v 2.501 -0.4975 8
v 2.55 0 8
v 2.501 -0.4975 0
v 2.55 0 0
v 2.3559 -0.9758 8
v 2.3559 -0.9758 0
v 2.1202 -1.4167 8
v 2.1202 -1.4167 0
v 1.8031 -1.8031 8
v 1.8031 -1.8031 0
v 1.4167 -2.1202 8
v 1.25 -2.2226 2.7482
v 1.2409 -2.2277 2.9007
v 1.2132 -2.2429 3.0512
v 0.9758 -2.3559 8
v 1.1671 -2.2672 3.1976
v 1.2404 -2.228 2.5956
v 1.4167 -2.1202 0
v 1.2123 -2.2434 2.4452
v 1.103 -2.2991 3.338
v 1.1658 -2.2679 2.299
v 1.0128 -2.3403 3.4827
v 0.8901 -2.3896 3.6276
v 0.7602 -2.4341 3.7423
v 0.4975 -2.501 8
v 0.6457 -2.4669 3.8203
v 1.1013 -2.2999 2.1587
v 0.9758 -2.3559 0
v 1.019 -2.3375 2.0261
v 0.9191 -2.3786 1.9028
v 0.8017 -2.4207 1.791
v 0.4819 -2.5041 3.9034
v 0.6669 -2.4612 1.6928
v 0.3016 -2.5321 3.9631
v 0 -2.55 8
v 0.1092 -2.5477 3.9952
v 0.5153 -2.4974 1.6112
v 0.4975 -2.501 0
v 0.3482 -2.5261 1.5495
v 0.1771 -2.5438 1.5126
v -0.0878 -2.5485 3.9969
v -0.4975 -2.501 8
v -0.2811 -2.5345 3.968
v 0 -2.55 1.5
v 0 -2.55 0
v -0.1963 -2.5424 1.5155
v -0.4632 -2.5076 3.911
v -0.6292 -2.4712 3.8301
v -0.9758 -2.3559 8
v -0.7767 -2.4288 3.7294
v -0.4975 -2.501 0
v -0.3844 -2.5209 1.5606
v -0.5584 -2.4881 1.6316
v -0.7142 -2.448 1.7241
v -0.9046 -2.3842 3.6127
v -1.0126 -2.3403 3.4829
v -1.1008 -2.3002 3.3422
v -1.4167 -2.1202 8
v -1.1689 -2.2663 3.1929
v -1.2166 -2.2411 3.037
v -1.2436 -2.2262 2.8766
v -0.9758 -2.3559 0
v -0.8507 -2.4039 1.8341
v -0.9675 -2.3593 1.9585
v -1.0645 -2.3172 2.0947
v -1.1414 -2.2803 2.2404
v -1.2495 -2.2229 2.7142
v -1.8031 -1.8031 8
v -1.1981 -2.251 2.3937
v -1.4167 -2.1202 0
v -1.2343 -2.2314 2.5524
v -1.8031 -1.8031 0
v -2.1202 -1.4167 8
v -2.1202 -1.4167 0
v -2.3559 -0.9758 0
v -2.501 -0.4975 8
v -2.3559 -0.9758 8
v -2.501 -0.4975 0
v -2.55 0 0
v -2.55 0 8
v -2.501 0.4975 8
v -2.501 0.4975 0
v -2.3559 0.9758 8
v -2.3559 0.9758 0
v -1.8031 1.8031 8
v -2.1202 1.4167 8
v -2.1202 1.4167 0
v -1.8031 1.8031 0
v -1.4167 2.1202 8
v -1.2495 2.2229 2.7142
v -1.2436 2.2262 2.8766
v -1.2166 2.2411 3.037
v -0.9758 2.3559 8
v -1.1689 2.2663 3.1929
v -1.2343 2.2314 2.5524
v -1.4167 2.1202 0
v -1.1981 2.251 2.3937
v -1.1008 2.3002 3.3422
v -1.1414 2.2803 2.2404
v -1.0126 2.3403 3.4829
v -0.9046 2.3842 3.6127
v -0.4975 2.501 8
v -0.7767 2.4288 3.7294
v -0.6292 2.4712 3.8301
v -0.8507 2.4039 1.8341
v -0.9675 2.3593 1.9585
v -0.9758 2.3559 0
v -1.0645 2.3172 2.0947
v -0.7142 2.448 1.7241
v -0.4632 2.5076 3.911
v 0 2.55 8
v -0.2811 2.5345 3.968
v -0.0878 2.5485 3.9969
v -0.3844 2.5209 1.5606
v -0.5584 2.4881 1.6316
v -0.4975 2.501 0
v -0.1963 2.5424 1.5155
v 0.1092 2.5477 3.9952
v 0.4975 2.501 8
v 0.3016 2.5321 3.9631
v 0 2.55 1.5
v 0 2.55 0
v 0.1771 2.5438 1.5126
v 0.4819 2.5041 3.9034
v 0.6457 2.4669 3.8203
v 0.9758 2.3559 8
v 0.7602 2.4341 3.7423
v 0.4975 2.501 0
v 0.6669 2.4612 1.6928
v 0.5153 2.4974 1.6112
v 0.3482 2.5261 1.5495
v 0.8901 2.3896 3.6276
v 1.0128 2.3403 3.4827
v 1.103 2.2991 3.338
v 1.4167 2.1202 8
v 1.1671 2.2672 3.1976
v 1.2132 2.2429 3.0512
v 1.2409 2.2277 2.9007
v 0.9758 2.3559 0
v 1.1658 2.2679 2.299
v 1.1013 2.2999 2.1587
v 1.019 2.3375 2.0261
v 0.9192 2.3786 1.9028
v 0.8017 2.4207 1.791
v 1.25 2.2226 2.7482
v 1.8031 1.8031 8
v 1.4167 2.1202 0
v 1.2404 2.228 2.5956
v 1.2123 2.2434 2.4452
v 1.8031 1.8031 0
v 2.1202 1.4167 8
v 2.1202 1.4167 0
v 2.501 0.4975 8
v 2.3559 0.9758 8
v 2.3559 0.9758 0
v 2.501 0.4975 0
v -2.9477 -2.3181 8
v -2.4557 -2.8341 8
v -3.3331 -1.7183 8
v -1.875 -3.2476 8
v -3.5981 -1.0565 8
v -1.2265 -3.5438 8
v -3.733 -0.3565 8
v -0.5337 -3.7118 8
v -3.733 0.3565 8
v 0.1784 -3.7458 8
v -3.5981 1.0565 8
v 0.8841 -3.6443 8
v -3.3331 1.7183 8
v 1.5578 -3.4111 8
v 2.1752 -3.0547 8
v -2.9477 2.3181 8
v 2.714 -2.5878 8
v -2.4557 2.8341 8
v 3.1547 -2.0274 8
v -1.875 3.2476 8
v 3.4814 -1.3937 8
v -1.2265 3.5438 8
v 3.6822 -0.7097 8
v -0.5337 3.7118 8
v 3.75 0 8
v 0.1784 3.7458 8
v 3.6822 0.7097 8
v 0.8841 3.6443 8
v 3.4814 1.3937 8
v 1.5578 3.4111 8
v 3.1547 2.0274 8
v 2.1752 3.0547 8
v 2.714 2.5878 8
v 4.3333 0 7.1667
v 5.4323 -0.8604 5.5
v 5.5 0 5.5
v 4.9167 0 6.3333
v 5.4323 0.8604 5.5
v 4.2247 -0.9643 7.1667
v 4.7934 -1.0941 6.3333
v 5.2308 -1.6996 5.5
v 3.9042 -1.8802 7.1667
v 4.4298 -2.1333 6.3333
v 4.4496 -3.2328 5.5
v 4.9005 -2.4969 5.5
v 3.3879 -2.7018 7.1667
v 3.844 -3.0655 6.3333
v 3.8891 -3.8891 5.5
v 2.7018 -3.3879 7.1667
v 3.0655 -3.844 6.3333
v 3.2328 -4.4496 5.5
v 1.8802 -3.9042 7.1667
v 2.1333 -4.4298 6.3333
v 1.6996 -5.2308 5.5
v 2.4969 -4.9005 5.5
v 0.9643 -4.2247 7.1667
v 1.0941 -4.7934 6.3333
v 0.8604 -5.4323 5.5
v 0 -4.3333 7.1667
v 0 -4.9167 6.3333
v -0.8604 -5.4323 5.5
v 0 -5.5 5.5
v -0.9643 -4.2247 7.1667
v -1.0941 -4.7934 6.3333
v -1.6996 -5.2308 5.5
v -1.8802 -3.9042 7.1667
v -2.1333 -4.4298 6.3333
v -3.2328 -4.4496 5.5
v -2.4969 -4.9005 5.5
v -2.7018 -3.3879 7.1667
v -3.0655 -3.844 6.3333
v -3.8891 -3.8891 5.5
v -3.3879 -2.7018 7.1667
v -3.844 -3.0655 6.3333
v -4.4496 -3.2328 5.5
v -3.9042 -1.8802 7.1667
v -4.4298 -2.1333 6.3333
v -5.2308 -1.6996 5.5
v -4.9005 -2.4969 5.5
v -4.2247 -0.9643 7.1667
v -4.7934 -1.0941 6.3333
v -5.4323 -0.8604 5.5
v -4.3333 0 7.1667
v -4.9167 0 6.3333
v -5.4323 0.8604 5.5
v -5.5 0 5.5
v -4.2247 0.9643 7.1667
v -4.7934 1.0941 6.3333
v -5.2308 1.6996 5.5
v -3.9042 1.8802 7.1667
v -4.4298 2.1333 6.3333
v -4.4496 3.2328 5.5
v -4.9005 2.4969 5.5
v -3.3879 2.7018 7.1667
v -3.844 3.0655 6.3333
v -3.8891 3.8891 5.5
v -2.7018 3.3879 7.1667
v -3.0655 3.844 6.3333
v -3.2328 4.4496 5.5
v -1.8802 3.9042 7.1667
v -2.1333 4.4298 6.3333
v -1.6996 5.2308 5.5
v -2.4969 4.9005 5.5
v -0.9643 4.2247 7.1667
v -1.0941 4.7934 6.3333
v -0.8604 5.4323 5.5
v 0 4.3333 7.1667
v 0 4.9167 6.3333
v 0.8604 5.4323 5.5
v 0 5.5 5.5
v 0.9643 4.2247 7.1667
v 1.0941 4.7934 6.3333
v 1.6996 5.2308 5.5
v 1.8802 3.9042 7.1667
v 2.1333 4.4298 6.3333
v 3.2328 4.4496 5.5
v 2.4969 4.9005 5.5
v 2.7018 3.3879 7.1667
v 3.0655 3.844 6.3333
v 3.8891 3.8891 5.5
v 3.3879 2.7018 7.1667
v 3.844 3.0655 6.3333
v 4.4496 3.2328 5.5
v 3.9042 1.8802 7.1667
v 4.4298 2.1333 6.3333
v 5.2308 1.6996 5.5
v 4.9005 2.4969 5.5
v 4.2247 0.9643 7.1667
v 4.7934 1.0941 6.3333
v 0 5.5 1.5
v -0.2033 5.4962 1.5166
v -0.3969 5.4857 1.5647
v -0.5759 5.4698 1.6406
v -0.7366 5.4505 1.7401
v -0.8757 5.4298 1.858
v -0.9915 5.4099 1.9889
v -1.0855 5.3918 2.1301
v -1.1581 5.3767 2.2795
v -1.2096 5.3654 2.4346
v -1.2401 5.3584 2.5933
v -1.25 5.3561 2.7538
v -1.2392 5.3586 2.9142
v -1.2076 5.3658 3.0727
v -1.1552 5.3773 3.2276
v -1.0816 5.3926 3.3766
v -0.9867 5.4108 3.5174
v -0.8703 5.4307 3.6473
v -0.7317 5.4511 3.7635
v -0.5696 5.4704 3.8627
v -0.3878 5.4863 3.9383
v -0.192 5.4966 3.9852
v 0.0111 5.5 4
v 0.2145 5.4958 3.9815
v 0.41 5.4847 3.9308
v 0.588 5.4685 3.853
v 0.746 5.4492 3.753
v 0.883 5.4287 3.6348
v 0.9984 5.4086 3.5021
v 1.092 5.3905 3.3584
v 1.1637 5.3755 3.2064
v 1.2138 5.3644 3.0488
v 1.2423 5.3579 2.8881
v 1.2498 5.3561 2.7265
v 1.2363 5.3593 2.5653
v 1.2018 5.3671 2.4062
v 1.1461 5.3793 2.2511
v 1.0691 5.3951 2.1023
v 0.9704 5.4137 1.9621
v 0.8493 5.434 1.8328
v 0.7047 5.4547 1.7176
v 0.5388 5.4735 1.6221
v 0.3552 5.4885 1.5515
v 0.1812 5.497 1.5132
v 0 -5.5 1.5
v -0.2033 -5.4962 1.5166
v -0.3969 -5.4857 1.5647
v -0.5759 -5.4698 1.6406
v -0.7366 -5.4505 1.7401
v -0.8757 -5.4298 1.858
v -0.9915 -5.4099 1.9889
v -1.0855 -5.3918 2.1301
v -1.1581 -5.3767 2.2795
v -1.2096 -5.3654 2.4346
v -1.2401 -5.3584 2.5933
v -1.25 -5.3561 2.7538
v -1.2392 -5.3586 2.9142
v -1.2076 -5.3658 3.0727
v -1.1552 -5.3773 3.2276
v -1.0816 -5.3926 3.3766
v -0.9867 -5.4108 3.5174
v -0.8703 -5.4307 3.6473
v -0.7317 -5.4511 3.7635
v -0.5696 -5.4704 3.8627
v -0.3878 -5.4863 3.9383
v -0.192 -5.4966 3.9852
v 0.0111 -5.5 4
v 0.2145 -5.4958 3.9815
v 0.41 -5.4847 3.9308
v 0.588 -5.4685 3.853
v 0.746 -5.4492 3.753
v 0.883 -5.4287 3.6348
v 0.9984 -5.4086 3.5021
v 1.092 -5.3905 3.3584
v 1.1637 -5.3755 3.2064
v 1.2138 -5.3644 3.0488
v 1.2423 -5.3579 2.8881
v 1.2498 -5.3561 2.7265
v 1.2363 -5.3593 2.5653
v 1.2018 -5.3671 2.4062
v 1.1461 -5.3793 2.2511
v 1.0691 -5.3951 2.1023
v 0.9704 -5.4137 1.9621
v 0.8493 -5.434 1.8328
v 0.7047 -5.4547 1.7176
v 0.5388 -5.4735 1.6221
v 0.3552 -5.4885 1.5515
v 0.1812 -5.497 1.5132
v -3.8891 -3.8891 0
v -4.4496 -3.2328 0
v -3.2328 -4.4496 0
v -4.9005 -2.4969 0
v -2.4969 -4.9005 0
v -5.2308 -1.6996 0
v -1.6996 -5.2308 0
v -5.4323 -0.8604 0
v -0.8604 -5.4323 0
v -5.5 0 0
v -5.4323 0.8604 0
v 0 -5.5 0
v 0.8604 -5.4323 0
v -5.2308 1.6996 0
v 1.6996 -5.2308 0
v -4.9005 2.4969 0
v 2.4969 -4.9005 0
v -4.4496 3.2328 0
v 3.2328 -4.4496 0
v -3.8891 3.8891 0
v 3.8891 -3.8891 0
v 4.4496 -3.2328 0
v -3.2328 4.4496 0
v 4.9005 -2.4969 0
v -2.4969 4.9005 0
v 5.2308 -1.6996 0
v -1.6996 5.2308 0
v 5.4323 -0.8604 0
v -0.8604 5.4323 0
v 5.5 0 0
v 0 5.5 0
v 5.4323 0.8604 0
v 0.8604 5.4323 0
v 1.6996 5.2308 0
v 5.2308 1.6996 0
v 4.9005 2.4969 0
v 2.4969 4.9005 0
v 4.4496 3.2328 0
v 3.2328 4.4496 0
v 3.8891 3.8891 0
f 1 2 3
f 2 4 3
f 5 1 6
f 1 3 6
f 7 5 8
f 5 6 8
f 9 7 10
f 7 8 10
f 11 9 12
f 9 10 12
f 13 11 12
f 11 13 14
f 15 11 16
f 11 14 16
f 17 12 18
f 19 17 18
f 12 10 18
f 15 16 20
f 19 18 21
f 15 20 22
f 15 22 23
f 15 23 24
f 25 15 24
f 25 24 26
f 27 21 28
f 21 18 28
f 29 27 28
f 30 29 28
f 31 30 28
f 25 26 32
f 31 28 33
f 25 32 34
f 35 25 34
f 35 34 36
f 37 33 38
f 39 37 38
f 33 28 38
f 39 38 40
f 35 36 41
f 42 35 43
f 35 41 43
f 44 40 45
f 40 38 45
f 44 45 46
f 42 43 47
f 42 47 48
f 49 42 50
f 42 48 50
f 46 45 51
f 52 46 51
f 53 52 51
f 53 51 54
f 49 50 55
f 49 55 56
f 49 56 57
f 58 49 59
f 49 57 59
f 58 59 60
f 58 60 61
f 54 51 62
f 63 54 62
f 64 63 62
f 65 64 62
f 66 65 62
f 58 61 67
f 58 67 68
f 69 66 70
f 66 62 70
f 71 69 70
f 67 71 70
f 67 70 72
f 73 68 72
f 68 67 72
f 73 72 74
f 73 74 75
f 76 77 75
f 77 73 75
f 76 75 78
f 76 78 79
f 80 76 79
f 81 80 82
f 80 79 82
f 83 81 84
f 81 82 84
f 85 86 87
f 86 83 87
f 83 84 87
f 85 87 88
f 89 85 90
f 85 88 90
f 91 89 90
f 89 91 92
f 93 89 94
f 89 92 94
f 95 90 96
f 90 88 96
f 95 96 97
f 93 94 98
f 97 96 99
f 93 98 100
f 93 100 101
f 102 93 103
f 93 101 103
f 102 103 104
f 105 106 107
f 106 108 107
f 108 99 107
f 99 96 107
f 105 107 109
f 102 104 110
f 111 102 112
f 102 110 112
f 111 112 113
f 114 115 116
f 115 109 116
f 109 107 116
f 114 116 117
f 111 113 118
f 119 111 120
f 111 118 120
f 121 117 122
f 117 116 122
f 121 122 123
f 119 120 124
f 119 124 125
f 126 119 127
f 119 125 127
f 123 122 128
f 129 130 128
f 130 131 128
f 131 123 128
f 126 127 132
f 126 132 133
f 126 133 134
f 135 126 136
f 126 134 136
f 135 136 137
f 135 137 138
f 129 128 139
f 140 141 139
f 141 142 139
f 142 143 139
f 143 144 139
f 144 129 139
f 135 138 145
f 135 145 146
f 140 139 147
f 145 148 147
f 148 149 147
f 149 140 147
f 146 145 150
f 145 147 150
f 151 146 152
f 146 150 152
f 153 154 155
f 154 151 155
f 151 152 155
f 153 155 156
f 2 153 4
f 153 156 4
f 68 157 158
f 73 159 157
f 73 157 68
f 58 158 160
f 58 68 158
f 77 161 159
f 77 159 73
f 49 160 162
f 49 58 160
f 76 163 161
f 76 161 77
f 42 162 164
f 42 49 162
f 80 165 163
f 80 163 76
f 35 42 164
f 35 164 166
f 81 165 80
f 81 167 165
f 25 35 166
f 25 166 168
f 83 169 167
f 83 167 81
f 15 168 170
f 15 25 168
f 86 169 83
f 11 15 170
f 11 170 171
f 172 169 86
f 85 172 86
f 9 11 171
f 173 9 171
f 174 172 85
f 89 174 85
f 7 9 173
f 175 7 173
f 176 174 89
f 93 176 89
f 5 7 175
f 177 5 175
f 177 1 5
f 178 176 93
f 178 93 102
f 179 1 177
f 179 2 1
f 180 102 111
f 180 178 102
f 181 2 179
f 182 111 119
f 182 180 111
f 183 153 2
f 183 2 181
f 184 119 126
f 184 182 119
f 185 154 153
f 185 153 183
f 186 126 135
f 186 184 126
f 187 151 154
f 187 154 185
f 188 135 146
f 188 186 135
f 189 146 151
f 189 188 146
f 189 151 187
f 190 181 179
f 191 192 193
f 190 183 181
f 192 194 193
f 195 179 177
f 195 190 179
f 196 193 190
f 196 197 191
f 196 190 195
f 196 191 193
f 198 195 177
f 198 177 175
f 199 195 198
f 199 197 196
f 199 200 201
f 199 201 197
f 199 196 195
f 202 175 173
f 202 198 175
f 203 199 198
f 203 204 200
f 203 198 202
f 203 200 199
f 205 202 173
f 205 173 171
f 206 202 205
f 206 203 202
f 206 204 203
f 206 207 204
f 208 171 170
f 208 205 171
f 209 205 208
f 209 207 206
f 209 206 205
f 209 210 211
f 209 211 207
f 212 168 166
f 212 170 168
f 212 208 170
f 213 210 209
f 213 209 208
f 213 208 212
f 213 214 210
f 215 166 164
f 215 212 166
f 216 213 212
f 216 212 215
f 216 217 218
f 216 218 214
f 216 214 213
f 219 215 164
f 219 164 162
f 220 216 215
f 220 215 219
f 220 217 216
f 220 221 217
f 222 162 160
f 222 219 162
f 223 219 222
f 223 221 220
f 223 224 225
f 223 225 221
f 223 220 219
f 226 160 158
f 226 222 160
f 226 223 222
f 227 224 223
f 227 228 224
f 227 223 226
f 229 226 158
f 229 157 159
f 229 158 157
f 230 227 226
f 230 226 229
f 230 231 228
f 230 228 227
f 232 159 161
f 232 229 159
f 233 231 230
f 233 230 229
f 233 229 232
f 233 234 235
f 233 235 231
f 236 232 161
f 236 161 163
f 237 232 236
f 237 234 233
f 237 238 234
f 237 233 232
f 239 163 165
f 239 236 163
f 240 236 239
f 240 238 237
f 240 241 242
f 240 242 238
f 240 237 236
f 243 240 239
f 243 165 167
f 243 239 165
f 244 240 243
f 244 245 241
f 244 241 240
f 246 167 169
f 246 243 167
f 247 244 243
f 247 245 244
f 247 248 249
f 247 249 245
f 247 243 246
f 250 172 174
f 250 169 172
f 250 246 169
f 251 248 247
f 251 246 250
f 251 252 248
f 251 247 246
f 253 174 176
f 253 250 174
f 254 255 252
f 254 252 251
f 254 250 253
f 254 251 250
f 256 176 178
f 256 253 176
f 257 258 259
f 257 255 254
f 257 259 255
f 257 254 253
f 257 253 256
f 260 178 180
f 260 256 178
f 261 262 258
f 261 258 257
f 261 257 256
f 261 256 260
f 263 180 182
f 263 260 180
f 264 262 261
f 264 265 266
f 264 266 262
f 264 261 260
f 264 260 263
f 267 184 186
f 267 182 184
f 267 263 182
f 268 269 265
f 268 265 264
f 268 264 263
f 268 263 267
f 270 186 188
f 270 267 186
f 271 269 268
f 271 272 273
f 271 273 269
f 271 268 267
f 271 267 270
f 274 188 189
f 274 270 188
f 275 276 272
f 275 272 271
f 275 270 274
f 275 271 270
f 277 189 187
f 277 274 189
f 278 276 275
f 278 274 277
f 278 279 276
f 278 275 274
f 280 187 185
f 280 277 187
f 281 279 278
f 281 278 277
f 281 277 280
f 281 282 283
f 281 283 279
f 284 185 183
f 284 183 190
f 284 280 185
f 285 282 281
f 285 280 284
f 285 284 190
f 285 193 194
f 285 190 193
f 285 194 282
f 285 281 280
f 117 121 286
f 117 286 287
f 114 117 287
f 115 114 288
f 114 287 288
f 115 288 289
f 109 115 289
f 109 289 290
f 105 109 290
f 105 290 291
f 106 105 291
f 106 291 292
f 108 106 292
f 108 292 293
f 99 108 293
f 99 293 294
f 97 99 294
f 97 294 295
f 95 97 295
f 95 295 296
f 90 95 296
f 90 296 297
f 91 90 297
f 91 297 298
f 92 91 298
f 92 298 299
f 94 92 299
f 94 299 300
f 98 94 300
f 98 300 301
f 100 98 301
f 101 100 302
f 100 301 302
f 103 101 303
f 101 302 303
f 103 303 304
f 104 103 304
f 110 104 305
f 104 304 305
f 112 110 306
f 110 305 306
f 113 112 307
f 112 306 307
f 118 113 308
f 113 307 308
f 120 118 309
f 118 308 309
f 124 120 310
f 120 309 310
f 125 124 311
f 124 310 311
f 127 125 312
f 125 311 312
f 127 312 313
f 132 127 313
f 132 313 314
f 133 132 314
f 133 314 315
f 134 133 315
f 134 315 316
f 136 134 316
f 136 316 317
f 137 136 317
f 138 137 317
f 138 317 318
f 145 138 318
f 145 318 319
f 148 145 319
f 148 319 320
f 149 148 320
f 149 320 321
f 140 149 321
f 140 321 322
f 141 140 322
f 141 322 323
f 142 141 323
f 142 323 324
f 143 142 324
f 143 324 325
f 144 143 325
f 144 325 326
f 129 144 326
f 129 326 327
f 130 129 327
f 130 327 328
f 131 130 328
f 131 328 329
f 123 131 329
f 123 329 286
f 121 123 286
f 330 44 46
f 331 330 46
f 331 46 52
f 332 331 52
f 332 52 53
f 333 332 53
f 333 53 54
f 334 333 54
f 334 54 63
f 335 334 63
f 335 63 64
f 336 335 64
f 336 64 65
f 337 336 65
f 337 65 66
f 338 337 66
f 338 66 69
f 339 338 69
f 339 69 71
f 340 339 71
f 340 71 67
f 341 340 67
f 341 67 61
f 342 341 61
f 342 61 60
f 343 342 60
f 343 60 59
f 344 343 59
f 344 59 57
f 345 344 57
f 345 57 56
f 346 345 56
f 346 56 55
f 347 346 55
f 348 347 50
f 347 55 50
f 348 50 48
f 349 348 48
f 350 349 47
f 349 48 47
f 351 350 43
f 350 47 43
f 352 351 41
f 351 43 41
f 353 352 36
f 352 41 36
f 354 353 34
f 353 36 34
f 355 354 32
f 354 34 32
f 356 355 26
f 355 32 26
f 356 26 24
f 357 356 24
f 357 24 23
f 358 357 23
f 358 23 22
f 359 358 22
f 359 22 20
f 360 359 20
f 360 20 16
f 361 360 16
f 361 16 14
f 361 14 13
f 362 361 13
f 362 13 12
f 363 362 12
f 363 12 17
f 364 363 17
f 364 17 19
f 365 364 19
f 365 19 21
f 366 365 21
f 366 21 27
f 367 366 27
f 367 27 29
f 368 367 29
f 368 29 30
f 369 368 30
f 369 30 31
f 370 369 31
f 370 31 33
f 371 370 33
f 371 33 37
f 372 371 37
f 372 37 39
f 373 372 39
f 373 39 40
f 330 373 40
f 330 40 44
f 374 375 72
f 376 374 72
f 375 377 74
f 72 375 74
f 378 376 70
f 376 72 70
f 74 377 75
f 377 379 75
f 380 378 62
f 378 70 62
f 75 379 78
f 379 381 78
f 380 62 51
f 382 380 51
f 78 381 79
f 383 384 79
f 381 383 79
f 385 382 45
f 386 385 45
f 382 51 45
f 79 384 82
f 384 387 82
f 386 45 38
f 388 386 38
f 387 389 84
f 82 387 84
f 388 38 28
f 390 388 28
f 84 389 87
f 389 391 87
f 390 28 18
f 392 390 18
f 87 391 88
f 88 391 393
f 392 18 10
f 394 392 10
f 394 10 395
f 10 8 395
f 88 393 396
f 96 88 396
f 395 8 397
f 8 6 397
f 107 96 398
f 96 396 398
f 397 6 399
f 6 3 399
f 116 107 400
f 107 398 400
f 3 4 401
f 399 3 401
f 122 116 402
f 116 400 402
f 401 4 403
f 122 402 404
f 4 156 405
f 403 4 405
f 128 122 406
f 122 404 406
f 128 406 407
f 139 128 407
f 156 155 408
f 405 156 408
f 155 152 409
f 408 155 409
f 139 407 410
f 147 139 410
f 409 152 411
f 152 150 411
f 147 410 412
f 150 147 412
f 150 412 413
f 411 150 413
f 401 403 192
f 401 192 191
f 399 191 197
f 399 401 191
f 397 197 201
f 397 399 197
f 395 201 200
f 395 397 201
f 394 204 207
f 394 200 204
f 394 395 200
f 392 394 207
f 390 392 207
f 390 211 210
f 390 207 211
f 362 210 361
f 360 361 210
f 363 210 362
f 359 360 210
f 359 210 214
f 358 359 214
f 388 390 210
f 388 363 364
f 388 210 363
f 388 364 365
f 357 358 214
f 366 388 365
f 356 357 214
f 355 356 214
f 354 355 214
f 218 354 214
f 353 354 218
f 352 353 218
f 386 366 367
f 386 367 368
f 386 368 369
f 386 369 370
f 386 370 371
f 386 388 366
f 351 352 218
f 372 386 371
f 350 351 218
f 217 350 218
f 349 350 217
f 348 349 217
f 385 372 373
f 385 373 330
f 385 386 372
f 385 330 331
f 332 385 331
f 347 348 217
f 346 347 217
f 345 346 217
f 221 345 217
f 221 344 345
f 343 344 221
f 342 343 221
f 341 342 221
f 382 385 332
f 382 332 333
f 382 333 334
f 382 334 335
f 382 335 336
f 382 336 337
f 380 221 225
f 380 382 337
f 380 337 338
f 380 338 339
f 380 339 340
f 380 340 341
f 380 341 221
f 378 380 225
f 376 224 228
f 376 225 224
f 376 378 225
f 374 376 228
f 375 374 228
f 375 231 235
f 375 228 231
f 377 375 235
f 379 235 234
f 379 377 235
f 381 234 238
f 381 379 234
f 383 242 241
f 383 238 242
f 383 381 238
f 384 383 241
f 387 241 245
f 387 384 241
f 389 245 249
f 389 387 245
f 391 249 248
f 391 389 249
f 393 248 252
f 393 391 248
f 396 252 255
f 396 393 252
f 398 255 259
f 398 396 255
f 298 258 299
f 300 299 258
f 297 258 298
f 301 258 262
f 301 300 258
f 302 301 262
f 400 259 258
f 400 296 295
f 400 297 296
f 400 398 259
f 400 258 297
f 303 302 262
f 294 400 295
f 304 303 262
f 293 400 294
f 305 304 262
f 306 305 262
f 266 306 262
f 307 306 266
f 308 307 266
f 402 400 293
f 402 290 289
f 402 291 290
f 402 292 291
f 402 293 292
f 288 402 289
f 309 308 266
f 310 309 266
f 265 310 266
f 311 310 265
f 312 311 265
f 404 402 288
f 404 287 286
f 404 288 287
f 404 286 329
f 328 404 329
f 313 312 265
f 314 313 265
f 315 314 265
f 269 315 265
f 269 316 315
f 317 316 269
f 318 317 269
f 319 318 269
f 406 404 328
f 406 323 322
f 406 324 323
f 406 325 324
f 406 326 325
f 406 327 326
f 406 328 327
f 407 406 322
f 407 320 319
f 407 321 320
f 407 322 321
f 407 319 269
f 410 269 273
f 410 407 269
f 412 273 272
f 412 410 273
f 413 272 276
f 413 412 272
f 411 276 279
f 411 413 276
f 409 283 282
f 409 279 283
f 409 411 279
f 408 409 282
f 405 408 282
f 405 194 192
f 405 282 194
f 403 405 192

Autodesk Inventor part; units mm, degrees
ref_plane "YZ Plane" through (0, 0, 0) normal (1, 0, 0) x (0, 1, 0)
ref_plane "XZ Plane" through (0, 0, 0) normal (0, 1, 0) x (-1, 0, 0)
ref_plane "XY Plane" through (0, 0, 0) normal (0, 0, 1) x (1, 0, 0)
sketch "Sketch1" plane through (0, 0, 0) normal (0, 0, 1) x (1, 0, 0)
  circle A0 centre (0, 0) radius 2.55
  circle A1 centre (0, 0) radius 5.5
  dimension "d0" = 5.1
  dimension "d1" = 11
extrude "Extrusion1" add sketch "Sketch1" along normal blind 8
chamfer "Chamfer1" distance 1.75 distance2 2.5 1 edges at (-5.5, 0, 8) measured on face at (4.4387, -0.6422, 8)
sketch "Sketch2" plane through (0, 0, 0) normal (0, 1, 0) x (-1, 0, 0)
  line L0 (-5.5, 0) -> (5.5, 0) projected
  line L1 (5.5, 5.5) -> (-5.5, 5.5) projected
  line L2 (-5.5, 0) -> (-5.5, 5.5) projected
  line L3 (5.5, 0) -> (5.5, 5.5) projected
  point P0 (0, 0)
  point P1 (0, 2.75)
  dimension "d7" = 11
  dimension "d8" = 5.5
  dimension "d9" = 5.5
  dimension "d10" = 2.75
hole "Hole1" at (0, 0, 2.75) direction (0, 1, 0) diameter 2.5 end through all both
equation "\"d8\" = 0.5 * d7"
equation "\"d10\" = 0.5 * d9"
properties part number "3DP_PLA_X_axis_idler_shaft_locking_ring"
